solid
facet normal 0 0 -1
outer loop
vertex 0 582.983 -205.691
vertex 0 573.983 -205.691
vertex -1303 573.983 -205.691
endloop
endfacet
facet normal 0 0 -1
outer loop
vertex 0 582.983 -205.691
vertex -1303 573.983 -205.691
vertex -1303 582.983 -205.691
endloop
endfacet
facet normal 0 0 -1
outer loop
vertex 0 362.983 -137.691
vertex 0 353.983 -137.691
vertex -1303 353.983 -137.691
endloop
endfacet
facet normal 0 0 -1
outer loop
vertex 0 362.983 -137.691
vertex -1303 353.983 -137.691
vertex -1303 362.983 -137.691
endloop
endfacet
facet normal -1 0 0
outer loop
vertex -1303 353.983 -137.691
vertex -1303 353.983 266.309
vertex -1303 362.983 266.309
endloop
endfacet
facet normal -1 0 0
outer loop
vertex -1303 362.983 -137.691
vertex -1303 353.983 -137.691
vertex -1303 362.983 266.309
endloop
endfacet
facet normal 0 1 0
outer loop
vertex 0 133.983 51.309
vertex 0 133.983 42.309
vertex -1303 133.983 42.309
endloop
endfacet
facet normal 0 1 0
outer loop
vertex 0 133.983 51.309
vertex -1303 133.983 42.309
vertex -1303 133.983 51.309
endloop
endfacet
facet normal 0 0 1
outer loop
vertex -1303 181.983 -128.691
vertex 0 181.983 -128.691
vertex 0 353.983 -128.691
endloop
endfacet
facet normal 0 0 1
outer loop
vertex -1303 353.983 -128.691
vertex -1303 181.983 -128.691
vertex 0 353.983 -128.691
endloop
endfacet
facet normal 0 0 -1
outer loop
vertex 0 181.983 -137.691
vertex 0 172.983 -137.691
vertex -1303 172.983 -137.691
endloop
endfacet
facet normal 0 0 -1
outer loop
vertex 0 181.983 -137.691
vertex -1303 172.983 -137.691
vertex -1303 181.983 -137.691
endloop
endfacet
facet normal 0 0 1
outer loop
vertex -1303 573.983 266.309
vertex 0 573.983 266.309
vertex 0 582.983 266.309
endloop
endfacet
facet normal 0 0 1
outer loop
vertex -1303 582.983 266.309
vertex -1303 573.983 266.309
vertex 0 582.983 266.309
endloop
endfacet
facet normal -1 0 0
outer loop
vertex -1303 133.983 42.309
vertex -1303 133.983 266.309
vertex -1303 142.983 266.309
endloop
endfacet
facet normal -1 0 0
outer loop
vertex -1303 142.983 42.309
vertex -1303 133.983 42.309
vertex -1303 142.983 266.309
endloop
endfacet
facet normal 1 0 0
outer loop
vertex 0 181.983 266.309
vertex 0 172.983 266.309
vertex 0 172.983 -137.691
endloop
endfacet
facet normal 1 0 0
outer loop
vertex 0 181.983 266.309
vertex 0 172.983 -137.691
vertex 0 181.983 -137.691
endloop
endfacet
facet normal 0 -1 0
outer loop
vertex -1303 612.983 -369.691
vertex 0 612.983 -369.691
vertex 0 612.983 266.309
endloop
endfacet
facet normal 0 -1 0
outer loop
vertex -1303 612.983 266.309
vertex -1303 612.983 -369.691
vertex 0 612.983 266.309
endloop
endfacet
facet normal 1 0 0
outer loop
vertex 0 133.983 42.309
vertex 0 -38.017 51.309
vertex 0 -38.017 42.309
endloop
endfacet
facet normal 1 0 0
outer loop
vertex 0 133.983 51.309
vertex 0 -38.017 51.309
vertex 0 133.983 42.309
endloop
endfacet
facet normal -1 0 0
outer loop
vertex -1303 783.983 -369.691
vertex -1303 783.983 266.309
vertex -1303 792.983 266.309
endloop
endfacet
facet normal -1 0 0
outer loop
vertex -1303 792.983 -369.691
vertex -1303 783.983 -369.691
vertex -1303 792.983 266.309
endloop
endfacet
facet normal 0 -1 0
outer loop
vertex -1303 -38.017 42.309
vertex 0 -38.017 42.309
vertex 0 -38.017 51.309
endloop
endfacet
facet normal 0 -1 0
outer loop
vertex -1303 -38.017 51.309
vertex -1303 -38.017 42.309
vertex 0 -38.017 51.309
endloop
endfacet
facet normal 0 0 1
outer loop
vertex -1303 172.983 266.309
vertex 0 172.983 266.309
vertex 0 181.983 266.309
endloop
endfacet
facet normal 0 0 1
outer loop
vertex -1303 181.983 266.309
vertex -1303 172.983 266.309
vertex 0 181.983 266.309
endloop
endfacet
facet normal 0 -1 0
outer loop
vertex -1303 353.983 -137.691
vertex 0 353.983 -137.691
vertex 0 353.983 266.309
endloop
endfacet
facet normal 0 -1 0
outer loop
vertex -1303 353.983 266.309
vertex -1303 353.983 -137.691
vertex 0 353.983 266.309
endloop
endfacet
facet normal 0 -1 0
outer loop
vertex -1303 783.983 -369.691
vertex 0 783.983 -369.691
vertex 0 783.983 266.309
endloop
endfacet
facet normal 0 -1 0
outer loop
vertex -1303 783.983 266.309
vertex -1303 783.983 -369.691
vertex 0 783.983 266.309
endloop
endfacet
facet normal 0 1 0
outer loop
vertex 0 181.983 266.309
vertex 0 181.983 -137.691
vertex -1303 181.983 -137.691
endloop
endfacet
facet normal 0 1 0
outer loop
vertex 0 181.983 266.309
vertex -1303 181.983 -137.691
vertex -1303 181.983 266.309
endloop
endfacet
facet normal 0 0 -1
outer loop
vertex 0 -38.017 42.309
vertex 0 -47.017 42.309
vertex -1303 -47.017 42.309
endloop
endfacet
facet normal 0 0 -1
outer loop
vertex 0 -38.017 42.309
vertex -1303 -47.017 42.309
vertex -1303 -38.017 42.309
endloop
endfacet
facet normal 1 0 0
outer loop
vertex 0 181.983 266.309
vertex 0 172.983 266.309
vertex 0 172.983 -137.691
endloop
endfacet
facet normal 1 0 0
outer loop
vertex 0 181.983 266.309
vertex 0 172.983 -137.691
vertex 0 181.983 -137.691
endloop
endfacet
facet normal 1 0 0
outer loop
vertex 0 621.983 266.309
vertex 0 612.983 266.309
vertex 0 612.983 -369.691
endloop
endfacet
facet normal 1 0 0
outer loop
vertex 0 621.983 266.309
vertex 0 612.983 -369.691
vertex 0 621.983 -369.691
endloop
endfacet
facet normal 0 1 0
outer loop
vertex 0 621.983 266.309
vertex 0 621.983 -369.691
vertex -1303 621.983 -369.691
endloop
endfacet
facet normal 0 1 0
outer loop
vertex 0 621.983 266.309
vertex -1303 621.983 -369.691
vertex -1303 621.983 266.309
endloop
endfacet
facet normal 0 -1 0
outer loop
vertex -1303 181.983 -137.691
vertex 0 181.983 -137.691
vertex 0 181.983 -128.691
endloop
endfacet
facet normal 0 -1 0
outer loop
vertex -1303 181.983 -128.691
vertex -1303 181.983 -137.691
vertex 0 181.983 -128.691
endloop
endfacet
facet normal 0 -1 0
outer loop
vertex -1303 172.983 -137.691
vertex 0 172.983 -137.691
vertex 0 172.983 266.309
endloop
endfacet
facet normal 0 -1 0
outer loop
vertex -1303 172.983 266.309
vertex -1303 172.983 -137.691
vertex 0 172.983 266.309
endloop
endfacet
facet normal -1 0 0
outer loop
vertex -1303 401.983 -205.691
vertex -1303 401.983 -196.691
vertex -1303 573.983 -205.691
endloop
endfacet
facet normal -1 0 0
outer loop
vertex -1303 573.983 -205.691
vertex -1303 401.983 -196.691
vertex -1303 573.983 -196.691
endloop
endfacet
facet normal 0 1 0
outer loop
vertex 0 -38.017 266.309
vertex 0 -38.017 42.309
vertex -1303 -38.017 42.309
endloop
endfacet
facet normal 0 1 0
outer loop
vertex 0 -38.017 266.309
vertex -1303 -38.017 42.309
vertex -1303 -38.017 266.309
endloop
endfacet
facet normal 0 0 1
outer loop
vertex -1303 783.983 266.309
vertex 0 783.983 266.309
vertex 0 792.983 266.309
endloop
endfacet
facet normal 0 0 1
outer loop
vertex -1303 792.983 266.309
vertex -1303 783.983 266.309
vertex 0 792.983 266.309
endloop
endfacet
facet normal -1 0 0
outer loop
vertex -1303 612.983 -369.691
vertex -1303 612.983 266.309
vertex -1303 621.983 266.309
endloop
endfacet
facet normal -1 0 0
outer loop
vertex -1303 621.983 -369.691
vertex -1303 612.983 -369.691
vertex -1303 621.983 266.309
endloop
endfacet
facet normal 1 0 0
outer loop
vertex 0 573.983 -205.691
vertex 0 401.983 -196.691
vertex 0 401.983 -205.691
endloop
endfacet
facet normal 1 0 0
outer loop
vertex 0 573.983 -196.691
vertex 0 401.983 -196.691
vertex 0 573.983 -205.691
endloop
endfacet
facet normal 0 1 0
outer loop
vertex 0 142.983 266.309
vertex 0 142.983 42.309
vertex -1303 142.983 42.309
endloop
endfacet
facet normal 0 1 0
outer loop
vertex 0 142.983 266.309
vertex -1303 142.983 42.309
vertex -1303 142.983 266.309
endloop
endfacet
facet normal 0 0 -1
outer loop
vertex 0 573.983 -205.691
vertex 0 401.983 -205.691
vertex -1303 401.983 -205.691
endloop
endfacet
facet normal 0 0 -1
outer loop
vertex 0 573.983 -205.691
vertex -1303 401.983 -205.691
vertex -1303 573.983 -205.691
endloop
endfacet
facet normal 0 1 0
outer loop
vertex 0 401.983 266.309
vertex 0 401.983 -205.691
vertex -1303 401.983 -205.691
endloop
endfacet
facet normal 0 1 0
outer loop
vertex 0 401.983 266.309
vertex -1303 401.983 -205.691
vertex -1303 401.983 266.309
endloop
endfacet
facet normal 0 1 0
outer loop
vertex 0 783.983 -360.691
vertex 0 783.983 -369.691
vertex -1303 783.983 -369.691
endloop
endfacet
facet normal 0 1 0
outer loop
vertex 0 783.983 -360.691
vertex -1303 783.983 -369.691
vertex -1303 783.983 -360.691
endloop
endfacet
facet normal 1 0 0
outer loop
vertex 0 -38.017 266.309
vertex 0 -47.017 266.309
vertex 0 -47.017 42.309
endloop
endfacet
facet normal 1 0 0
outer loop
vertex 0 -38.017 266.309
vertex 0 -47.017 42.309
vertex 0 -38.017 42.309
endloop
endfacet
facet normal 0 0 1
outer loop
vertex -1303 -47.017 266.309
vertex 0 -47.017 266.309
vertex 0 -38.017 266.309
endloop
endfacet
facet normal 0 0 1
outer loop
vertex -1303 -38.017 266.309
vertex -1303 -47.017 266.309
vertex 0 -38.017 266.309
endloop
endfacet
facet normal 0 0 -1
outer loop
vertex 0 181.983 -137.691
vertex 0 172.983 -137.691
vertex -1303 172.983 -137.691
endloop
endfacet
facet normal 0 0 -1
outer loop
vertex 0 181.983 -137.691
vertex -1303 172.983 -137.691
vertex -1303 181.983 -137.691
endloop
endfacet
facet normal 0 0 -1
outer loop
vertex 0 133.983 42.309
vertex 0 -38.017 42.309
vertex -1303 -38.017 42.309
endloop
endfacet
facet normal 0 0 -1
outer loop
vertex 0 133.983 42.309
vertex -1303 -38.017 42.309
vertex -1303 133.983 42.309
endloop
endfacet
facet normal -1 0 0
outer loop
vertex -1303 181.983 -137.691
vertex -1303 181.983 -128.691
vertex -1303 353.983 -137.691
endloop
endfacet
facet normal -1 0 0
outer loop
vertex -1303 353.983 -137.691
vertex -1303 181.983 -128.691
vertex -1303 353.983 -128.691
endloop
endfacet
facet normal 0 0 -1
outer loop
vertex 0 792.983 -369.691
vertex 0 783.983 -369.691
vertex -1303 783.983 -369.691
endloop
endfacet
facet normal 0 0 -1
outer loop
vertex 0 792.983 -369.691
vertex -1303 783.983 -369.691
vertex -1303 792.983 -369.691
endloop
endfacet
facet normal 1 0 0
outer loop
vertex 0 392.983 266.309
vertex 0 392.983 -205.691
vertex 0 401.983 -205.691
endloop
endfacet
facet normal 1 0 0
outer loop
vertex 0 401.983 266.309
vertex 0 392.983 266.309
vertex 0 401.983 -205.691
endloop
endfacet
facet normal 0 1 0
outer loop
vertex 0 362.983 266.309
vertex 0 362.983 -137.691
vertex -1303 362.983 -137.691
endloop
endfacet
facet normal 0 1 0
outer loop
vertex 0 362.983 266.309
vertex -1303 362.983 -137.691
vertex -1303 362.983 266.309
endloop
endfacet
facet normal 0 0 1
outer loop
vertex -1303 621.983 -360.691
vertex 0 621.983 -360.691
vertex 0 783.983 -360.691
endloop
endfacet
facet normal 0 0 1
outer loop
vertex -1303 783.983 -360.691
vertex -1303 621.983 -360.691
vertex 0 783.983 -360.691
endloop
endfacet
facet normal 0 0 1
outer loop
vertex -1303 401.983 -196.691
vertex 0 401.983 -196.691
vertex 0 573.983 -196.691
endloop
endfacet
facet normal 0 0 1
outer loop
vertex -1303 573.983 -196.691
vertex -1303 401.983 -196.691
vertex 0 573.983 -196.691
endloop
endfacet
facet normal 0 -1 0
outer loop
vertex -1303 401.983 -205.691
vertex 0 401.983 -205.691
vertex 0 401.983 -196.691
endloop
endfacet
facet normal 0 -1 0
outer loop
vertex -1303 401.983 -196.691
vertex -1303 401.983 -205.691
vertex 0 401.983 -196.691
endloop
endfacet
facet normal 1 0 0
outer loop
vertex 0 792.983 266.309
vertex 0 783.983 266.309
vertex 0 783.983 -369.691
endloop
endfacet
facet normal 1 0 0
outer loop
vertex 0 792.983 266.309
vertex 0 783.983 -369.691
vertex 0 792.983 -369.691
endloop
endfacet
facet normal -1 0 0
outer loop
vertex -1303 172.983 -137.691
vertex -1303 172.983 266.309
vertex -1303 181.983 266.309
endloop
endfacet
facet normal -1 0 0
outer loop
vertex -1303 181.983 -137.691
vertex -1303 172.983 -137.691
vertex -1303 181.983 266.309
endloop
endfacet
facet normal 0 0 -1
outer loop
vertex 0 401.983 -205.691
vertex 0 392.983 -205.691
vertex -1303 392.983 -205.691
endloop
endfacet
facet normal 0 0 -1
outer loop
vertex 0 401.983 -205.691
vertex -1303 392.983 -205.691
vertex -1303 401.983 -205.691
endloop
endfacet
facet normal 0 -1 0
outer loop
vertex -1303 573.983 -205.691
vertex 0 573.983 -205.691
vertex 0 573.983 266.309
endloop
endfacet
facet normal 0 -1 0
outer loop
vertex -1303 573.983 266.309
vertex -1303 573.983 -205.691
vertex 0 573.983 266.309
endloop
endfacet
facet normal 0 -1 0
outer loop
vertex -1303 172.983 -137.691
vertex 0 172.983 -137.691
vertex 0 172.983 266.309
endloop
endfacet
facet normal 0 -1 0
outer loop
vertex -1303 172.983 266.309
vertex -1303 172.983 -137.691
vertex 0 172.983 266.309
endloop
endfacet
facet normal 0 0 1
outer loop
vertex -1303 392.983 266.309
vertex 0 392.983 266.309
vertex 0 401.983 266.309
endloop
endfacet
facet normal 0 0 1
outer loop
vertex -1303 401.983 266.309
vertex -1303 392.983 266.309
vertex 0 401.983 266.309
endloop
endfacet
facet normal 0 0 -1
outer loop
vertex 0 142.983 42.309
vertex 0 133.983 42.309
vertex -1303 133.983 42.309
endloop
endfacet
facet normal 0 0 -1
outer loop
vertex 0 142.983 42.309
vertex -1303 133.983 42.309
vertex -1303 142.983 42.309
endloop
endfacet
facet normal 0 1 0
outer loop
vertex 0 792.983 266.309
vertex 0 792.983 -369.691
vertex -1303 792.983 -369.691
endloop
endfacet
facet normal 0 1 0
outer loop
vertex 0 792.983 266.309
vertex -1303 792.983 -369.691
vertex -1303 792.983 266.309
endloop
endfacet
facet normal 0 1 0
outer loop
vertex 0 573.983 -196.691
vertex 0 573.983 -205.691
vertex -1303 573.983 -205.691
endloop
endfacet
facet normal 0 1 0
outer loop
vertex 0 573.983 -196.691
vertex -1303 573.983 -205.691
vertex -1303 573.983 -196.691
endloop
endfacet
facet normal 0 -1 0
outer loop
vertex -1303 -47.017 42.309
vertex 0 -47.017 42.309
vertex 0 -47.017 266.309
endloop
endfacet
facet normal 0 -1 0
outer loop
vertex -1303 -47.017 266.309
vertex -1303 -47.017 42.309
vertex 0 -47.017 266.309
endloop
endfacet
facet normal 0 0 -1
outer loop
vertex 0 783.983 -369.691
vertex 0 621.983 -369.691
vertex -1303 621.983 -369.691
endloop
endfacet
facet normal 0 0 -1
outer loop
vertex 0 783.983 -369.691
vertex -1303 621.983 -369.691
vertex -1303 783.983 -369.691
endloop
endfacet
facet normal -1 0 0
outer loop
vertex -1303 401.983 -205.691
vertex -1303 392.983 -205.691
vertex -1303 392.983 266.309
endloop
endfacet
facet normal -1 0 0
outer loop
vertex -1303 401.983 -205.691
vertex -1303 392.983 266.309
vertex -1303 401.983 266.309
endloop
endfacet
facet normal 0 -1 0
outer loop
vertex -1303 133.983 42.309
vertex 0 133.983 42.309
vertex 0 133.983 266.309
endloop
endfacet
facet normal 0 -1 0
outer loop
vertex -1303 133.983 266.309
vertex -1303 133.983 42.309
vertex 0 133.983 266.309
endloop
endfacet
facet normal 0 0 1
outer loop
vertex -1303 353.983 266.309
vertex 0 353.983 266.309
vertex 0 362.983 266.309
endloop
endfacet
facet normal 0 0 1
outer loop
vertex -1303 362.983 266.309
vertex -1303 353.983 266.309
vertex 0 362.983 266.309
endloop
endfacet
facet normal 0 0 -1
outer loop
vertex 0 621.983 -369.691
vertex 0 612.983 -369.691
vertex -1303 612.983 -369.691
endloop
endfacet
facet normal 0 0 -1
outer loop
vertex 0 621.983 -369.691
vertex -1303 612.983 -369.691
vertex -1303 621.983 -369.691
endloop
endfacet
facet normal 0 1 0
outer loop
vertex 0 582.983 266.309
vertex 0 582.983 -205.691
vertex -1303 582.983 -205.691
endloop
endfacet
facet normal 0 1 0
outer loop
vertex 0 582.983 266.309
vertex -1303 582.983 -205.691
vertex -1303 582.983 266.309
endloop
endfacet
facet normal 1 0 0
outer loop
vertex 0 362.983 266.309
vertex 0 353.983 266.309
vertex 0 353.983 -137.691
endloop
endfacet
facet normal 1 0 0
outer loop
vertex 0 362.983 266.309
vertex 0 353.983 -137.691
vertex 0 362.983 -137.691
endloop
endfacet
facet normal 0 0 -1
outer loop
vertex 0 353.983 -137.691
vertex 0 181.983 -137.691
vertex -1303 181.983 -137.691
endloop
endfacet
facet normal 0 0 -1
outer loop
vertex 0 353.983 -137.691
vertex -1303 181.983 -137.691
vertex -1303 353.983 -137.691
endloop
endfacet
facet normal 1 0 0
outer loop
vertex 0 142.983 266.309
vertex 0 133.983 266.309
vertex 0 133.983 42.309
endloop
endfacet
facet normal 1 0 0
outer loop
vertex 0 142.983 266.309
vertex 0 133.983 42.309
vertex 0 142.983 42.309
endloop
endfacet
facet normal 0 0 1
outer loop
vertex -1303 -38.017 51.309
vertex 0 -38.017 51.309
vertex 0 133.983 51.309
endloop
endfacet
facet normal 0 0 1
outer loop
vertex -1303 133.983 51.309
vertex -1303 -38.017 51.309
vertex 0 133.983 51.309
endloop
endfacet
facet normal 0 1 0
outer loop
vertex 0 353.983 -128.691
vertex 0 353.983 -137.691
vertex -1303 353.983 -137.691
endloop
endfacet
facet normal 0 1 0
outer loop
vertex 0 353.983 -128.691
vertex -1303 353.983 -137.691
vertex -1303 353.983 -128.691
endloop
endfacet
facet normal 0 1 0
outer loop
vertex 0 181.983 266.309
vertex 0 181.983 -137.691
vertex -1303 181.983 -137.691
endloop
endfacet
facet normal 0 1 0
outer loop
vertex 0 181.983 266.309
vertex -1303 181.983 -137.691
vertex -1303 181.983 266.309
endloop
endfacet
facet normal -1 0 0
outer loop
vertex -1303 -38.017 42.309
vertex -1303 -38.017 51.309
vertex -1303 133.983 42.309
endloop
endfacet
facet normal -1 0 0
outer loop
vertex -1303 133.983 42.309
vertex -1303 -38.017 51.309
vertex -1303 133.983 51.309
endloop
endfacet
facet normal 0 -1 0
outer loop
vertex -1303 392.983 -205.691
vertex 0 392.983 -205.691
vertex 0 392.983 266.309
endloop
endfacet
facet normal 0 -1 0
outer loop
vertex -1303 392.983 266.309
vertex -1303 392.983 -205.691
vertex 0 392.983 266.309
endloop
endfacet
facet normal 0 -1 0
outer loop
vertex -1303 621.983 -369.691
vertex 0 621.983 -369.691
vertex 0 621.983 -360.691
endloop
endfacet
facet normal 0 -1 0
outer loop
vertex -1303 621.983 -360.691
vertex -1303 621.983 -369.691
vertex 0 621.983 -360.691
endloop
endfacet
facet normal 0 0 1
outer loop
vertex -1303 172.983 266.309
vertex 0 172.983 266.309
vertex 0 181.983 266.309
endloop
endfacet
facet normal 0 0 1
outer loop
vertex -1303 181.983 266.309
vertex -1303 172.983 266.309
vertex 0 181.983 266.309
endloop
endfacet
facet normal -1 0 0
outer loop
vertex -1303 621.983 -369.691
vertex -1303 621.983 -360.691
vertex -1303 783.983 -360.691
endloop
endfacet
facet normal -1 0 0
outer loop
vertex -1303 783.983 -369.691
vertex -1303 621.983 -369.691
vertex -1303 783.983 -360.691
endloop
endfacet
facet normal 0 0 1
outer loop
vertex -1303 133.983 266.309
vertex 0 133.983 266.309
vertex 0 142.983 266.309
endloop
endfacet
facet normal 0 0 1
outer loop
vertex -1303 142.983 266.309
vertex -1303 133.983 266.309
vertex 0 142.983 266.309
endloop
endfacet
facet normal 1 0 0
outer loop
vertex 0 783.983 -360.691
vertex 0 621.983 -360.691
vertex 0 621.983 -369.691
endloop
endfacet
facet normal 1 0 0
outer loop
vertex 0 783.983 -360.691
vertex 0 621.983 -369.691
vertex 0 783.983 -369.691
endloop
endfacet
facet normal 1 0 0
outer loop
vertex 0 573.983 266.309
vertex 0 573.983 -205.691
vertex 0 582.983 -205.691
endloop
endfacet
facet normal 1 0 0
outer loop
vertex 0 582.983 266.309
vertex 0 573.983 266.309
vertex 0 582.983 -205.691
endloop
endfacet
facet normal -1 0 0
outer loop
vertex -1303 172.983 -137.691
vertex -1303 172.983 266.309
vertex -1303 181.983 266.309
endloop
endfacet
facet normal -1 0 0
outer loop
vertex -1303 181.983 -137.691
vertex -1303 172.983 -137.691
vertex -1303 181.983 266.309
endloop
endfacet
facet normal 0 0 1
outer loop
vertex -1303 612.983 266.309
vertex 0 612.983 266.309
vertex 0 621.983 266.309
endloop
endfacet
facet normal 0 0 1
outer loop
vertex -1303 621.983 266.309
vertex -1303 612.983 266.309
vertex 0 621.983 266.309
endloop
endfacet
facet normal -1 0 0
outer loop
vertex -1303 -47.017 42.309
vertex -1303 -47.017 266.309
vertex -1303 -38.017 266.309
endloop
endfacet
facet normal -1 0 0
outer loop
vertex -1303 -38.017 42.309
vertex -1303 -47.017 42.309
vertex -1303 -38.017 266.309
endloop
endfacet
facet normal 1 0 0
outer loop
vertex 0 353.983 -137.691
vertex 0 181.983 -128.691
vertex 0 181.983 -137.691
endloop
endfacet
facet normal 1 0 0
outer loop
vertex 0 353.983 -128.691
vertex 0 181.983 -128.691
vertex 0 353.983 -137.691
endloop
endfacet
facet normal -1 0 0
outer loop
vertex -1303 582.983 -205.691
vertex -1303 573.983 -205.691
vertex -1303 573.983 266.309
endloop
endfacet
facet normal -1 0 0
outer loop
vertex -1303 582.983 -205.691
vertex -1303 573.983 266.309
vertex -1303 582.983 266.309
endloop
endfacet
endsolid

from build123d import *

# Parameters (mm, degrees)
F0_W      = 9
F0_H      = 224
F1_DEPTH  = 1303
F2_W      = 172
F2_H      = 9
F3_DEPTH  = 1303
F4_W      = 9
F4_H      = 224
F5_DEPTH  = 1303
F6_W      = 9
F6_H      = 404
F7_DEPTH  = 1303
F8_W      = 172
F8_H      = 9
F9_DEPTH  = 1303
F10_W     = 9
F10_H     = 404
F11_DEPTH = 1303
F12_W     = 9
F12_H     = 472
F13_DEPTH = 1303
F14_W     = 172
F14_H     = 9
F15_DEPTH = 1303
F16_W     = 9
F16_H     = 472
F17_DEPTH = 1303
F18_W     = 9
F18_H     = 636
F19_DEPTH = 1303
F20_W     = 162
F20_H     = 9
F21_DEPTH = 1303
F22_W     = 9
F22_H     = 636
F23_DEPTH = 1303


with BuildPart() as f1:
    # F0 (on Right) → F1 (new body)
    with BuildSketch(Plane.YZ):
        with Locations((-42.51715, 154.30868)):
            Rectangle(F0_W, F0_H)
    extrude(amount=-F1_DEPTH)


with BuildPart() as f3:
    # F2 (on Right) → F3 (new body, through all)
    with BuildSketch(Plane.YZ):
        with Locations((47.98285, 46.80868)):
            Rectangle(F2_W, F2_H)
    extrude(amount=-F3_DEPTH)


with BuildPart() as f5:
    # F4 (on Right) → F5 (new body, through all)
    with BuildSketch(Plane.YZ):
        with Locations((138.48285, 154.30868)):
            Rectangle(F4_W, F4_H)
    extrude(amount=-F5_DEPTH)


with BuildPart() as f7:
    # F6 (on Right) → F7 (new body, through all)
    with BuildSketch(Plane.YZ):
        with Locations((177.48285, 64.30868)):
            Rectangle(F6_W, F6_H)
    extrude(amount=-F7_DEPTH)


with BuildPart() as f9:
    # F8 (on Right) → F9 (new body, through all)
    with BuildSketch(Plane.YZ):
        with Locations((267.98285, -133.19132)):
            Rectangle(F8_W, F8_H)
    extrude(amount=-F9_DEPTH)


with BuildPart() as f11:
    # F10 (on Right) → F11 (new body, through all)
    with BuildSketch(Plane.YZ):
        with Locations((358.48285, 64.30868)):
            Rectangle(F10_W, F10_H)
    extrude(amount=-F11_DEPTH)


with BuildPart() as f13:
    # F12 (on Right) → F13 (new body, through all)
    with BuildSketch(Plane.YZ):
        with Locations((397.48285, 30.30868)):
            Rectangle(F12_W, F12_H)
    extrude(amount=-F13_DEPTH)


with BuildPart() as f15:
    # F14 (on Right) → F15 (new body, through all)
    with BuildSketch(Plane.YZ):
        with Locations((487.98285, -201.19132)):
            Rectangle(F14_W, F14_H)
    extrude(amount=-F15_DEPTH)


with BuildPart() as f17:
    # F16 (on face) → F17 (new body, through all)
    with BuildSketch(Plane.YZ):
        with Locations((578.48285, 30.30868)):
            Rectangle(F16_W, F16_H)
    extrude(amount=-F17_DEPTH)


with BuildPart() as f19:
    # F18 (on face) → F19 (new body, through all)
    with BuildSketch(Plane.YZ):
        with Locations((617.48285, -51.69132)):
            Rectangle(F18_W, F18_H)
    extrude(amount=-F19_DEPTH)


with BuildPart() as f21:
    # F20 (on face) → F21 (new body, through all)
    with BuildSketch(Plane.YZ):
        with Locations((702.98285, -365.19132)):
            Rectangle(F20_W, F20_H)
    extrude(amount=-F21_DEPTH)


with BuildPart() as f23:
    # F6 (on Right) + F22 (on face) → F23 (new body, through all)
    with BuildSketch(Plane.YZ):
        with Locations((177.48285, 64.30868)):
            Rectangle(F6_W, F6_H)
    with BuildSketch(Plane.YZ):
        with Locations((788.48285, -51.69132)):
            Rectangle(F22_W, F22_H)
    extrude(amount=-F23_DEPTH)


solid = Compound([f1.part, f3.part, f5.part, f7.part, f9.part, f11.part, f13.part, f15.part, f17.part, f19.part, f21.part, f23.part])
